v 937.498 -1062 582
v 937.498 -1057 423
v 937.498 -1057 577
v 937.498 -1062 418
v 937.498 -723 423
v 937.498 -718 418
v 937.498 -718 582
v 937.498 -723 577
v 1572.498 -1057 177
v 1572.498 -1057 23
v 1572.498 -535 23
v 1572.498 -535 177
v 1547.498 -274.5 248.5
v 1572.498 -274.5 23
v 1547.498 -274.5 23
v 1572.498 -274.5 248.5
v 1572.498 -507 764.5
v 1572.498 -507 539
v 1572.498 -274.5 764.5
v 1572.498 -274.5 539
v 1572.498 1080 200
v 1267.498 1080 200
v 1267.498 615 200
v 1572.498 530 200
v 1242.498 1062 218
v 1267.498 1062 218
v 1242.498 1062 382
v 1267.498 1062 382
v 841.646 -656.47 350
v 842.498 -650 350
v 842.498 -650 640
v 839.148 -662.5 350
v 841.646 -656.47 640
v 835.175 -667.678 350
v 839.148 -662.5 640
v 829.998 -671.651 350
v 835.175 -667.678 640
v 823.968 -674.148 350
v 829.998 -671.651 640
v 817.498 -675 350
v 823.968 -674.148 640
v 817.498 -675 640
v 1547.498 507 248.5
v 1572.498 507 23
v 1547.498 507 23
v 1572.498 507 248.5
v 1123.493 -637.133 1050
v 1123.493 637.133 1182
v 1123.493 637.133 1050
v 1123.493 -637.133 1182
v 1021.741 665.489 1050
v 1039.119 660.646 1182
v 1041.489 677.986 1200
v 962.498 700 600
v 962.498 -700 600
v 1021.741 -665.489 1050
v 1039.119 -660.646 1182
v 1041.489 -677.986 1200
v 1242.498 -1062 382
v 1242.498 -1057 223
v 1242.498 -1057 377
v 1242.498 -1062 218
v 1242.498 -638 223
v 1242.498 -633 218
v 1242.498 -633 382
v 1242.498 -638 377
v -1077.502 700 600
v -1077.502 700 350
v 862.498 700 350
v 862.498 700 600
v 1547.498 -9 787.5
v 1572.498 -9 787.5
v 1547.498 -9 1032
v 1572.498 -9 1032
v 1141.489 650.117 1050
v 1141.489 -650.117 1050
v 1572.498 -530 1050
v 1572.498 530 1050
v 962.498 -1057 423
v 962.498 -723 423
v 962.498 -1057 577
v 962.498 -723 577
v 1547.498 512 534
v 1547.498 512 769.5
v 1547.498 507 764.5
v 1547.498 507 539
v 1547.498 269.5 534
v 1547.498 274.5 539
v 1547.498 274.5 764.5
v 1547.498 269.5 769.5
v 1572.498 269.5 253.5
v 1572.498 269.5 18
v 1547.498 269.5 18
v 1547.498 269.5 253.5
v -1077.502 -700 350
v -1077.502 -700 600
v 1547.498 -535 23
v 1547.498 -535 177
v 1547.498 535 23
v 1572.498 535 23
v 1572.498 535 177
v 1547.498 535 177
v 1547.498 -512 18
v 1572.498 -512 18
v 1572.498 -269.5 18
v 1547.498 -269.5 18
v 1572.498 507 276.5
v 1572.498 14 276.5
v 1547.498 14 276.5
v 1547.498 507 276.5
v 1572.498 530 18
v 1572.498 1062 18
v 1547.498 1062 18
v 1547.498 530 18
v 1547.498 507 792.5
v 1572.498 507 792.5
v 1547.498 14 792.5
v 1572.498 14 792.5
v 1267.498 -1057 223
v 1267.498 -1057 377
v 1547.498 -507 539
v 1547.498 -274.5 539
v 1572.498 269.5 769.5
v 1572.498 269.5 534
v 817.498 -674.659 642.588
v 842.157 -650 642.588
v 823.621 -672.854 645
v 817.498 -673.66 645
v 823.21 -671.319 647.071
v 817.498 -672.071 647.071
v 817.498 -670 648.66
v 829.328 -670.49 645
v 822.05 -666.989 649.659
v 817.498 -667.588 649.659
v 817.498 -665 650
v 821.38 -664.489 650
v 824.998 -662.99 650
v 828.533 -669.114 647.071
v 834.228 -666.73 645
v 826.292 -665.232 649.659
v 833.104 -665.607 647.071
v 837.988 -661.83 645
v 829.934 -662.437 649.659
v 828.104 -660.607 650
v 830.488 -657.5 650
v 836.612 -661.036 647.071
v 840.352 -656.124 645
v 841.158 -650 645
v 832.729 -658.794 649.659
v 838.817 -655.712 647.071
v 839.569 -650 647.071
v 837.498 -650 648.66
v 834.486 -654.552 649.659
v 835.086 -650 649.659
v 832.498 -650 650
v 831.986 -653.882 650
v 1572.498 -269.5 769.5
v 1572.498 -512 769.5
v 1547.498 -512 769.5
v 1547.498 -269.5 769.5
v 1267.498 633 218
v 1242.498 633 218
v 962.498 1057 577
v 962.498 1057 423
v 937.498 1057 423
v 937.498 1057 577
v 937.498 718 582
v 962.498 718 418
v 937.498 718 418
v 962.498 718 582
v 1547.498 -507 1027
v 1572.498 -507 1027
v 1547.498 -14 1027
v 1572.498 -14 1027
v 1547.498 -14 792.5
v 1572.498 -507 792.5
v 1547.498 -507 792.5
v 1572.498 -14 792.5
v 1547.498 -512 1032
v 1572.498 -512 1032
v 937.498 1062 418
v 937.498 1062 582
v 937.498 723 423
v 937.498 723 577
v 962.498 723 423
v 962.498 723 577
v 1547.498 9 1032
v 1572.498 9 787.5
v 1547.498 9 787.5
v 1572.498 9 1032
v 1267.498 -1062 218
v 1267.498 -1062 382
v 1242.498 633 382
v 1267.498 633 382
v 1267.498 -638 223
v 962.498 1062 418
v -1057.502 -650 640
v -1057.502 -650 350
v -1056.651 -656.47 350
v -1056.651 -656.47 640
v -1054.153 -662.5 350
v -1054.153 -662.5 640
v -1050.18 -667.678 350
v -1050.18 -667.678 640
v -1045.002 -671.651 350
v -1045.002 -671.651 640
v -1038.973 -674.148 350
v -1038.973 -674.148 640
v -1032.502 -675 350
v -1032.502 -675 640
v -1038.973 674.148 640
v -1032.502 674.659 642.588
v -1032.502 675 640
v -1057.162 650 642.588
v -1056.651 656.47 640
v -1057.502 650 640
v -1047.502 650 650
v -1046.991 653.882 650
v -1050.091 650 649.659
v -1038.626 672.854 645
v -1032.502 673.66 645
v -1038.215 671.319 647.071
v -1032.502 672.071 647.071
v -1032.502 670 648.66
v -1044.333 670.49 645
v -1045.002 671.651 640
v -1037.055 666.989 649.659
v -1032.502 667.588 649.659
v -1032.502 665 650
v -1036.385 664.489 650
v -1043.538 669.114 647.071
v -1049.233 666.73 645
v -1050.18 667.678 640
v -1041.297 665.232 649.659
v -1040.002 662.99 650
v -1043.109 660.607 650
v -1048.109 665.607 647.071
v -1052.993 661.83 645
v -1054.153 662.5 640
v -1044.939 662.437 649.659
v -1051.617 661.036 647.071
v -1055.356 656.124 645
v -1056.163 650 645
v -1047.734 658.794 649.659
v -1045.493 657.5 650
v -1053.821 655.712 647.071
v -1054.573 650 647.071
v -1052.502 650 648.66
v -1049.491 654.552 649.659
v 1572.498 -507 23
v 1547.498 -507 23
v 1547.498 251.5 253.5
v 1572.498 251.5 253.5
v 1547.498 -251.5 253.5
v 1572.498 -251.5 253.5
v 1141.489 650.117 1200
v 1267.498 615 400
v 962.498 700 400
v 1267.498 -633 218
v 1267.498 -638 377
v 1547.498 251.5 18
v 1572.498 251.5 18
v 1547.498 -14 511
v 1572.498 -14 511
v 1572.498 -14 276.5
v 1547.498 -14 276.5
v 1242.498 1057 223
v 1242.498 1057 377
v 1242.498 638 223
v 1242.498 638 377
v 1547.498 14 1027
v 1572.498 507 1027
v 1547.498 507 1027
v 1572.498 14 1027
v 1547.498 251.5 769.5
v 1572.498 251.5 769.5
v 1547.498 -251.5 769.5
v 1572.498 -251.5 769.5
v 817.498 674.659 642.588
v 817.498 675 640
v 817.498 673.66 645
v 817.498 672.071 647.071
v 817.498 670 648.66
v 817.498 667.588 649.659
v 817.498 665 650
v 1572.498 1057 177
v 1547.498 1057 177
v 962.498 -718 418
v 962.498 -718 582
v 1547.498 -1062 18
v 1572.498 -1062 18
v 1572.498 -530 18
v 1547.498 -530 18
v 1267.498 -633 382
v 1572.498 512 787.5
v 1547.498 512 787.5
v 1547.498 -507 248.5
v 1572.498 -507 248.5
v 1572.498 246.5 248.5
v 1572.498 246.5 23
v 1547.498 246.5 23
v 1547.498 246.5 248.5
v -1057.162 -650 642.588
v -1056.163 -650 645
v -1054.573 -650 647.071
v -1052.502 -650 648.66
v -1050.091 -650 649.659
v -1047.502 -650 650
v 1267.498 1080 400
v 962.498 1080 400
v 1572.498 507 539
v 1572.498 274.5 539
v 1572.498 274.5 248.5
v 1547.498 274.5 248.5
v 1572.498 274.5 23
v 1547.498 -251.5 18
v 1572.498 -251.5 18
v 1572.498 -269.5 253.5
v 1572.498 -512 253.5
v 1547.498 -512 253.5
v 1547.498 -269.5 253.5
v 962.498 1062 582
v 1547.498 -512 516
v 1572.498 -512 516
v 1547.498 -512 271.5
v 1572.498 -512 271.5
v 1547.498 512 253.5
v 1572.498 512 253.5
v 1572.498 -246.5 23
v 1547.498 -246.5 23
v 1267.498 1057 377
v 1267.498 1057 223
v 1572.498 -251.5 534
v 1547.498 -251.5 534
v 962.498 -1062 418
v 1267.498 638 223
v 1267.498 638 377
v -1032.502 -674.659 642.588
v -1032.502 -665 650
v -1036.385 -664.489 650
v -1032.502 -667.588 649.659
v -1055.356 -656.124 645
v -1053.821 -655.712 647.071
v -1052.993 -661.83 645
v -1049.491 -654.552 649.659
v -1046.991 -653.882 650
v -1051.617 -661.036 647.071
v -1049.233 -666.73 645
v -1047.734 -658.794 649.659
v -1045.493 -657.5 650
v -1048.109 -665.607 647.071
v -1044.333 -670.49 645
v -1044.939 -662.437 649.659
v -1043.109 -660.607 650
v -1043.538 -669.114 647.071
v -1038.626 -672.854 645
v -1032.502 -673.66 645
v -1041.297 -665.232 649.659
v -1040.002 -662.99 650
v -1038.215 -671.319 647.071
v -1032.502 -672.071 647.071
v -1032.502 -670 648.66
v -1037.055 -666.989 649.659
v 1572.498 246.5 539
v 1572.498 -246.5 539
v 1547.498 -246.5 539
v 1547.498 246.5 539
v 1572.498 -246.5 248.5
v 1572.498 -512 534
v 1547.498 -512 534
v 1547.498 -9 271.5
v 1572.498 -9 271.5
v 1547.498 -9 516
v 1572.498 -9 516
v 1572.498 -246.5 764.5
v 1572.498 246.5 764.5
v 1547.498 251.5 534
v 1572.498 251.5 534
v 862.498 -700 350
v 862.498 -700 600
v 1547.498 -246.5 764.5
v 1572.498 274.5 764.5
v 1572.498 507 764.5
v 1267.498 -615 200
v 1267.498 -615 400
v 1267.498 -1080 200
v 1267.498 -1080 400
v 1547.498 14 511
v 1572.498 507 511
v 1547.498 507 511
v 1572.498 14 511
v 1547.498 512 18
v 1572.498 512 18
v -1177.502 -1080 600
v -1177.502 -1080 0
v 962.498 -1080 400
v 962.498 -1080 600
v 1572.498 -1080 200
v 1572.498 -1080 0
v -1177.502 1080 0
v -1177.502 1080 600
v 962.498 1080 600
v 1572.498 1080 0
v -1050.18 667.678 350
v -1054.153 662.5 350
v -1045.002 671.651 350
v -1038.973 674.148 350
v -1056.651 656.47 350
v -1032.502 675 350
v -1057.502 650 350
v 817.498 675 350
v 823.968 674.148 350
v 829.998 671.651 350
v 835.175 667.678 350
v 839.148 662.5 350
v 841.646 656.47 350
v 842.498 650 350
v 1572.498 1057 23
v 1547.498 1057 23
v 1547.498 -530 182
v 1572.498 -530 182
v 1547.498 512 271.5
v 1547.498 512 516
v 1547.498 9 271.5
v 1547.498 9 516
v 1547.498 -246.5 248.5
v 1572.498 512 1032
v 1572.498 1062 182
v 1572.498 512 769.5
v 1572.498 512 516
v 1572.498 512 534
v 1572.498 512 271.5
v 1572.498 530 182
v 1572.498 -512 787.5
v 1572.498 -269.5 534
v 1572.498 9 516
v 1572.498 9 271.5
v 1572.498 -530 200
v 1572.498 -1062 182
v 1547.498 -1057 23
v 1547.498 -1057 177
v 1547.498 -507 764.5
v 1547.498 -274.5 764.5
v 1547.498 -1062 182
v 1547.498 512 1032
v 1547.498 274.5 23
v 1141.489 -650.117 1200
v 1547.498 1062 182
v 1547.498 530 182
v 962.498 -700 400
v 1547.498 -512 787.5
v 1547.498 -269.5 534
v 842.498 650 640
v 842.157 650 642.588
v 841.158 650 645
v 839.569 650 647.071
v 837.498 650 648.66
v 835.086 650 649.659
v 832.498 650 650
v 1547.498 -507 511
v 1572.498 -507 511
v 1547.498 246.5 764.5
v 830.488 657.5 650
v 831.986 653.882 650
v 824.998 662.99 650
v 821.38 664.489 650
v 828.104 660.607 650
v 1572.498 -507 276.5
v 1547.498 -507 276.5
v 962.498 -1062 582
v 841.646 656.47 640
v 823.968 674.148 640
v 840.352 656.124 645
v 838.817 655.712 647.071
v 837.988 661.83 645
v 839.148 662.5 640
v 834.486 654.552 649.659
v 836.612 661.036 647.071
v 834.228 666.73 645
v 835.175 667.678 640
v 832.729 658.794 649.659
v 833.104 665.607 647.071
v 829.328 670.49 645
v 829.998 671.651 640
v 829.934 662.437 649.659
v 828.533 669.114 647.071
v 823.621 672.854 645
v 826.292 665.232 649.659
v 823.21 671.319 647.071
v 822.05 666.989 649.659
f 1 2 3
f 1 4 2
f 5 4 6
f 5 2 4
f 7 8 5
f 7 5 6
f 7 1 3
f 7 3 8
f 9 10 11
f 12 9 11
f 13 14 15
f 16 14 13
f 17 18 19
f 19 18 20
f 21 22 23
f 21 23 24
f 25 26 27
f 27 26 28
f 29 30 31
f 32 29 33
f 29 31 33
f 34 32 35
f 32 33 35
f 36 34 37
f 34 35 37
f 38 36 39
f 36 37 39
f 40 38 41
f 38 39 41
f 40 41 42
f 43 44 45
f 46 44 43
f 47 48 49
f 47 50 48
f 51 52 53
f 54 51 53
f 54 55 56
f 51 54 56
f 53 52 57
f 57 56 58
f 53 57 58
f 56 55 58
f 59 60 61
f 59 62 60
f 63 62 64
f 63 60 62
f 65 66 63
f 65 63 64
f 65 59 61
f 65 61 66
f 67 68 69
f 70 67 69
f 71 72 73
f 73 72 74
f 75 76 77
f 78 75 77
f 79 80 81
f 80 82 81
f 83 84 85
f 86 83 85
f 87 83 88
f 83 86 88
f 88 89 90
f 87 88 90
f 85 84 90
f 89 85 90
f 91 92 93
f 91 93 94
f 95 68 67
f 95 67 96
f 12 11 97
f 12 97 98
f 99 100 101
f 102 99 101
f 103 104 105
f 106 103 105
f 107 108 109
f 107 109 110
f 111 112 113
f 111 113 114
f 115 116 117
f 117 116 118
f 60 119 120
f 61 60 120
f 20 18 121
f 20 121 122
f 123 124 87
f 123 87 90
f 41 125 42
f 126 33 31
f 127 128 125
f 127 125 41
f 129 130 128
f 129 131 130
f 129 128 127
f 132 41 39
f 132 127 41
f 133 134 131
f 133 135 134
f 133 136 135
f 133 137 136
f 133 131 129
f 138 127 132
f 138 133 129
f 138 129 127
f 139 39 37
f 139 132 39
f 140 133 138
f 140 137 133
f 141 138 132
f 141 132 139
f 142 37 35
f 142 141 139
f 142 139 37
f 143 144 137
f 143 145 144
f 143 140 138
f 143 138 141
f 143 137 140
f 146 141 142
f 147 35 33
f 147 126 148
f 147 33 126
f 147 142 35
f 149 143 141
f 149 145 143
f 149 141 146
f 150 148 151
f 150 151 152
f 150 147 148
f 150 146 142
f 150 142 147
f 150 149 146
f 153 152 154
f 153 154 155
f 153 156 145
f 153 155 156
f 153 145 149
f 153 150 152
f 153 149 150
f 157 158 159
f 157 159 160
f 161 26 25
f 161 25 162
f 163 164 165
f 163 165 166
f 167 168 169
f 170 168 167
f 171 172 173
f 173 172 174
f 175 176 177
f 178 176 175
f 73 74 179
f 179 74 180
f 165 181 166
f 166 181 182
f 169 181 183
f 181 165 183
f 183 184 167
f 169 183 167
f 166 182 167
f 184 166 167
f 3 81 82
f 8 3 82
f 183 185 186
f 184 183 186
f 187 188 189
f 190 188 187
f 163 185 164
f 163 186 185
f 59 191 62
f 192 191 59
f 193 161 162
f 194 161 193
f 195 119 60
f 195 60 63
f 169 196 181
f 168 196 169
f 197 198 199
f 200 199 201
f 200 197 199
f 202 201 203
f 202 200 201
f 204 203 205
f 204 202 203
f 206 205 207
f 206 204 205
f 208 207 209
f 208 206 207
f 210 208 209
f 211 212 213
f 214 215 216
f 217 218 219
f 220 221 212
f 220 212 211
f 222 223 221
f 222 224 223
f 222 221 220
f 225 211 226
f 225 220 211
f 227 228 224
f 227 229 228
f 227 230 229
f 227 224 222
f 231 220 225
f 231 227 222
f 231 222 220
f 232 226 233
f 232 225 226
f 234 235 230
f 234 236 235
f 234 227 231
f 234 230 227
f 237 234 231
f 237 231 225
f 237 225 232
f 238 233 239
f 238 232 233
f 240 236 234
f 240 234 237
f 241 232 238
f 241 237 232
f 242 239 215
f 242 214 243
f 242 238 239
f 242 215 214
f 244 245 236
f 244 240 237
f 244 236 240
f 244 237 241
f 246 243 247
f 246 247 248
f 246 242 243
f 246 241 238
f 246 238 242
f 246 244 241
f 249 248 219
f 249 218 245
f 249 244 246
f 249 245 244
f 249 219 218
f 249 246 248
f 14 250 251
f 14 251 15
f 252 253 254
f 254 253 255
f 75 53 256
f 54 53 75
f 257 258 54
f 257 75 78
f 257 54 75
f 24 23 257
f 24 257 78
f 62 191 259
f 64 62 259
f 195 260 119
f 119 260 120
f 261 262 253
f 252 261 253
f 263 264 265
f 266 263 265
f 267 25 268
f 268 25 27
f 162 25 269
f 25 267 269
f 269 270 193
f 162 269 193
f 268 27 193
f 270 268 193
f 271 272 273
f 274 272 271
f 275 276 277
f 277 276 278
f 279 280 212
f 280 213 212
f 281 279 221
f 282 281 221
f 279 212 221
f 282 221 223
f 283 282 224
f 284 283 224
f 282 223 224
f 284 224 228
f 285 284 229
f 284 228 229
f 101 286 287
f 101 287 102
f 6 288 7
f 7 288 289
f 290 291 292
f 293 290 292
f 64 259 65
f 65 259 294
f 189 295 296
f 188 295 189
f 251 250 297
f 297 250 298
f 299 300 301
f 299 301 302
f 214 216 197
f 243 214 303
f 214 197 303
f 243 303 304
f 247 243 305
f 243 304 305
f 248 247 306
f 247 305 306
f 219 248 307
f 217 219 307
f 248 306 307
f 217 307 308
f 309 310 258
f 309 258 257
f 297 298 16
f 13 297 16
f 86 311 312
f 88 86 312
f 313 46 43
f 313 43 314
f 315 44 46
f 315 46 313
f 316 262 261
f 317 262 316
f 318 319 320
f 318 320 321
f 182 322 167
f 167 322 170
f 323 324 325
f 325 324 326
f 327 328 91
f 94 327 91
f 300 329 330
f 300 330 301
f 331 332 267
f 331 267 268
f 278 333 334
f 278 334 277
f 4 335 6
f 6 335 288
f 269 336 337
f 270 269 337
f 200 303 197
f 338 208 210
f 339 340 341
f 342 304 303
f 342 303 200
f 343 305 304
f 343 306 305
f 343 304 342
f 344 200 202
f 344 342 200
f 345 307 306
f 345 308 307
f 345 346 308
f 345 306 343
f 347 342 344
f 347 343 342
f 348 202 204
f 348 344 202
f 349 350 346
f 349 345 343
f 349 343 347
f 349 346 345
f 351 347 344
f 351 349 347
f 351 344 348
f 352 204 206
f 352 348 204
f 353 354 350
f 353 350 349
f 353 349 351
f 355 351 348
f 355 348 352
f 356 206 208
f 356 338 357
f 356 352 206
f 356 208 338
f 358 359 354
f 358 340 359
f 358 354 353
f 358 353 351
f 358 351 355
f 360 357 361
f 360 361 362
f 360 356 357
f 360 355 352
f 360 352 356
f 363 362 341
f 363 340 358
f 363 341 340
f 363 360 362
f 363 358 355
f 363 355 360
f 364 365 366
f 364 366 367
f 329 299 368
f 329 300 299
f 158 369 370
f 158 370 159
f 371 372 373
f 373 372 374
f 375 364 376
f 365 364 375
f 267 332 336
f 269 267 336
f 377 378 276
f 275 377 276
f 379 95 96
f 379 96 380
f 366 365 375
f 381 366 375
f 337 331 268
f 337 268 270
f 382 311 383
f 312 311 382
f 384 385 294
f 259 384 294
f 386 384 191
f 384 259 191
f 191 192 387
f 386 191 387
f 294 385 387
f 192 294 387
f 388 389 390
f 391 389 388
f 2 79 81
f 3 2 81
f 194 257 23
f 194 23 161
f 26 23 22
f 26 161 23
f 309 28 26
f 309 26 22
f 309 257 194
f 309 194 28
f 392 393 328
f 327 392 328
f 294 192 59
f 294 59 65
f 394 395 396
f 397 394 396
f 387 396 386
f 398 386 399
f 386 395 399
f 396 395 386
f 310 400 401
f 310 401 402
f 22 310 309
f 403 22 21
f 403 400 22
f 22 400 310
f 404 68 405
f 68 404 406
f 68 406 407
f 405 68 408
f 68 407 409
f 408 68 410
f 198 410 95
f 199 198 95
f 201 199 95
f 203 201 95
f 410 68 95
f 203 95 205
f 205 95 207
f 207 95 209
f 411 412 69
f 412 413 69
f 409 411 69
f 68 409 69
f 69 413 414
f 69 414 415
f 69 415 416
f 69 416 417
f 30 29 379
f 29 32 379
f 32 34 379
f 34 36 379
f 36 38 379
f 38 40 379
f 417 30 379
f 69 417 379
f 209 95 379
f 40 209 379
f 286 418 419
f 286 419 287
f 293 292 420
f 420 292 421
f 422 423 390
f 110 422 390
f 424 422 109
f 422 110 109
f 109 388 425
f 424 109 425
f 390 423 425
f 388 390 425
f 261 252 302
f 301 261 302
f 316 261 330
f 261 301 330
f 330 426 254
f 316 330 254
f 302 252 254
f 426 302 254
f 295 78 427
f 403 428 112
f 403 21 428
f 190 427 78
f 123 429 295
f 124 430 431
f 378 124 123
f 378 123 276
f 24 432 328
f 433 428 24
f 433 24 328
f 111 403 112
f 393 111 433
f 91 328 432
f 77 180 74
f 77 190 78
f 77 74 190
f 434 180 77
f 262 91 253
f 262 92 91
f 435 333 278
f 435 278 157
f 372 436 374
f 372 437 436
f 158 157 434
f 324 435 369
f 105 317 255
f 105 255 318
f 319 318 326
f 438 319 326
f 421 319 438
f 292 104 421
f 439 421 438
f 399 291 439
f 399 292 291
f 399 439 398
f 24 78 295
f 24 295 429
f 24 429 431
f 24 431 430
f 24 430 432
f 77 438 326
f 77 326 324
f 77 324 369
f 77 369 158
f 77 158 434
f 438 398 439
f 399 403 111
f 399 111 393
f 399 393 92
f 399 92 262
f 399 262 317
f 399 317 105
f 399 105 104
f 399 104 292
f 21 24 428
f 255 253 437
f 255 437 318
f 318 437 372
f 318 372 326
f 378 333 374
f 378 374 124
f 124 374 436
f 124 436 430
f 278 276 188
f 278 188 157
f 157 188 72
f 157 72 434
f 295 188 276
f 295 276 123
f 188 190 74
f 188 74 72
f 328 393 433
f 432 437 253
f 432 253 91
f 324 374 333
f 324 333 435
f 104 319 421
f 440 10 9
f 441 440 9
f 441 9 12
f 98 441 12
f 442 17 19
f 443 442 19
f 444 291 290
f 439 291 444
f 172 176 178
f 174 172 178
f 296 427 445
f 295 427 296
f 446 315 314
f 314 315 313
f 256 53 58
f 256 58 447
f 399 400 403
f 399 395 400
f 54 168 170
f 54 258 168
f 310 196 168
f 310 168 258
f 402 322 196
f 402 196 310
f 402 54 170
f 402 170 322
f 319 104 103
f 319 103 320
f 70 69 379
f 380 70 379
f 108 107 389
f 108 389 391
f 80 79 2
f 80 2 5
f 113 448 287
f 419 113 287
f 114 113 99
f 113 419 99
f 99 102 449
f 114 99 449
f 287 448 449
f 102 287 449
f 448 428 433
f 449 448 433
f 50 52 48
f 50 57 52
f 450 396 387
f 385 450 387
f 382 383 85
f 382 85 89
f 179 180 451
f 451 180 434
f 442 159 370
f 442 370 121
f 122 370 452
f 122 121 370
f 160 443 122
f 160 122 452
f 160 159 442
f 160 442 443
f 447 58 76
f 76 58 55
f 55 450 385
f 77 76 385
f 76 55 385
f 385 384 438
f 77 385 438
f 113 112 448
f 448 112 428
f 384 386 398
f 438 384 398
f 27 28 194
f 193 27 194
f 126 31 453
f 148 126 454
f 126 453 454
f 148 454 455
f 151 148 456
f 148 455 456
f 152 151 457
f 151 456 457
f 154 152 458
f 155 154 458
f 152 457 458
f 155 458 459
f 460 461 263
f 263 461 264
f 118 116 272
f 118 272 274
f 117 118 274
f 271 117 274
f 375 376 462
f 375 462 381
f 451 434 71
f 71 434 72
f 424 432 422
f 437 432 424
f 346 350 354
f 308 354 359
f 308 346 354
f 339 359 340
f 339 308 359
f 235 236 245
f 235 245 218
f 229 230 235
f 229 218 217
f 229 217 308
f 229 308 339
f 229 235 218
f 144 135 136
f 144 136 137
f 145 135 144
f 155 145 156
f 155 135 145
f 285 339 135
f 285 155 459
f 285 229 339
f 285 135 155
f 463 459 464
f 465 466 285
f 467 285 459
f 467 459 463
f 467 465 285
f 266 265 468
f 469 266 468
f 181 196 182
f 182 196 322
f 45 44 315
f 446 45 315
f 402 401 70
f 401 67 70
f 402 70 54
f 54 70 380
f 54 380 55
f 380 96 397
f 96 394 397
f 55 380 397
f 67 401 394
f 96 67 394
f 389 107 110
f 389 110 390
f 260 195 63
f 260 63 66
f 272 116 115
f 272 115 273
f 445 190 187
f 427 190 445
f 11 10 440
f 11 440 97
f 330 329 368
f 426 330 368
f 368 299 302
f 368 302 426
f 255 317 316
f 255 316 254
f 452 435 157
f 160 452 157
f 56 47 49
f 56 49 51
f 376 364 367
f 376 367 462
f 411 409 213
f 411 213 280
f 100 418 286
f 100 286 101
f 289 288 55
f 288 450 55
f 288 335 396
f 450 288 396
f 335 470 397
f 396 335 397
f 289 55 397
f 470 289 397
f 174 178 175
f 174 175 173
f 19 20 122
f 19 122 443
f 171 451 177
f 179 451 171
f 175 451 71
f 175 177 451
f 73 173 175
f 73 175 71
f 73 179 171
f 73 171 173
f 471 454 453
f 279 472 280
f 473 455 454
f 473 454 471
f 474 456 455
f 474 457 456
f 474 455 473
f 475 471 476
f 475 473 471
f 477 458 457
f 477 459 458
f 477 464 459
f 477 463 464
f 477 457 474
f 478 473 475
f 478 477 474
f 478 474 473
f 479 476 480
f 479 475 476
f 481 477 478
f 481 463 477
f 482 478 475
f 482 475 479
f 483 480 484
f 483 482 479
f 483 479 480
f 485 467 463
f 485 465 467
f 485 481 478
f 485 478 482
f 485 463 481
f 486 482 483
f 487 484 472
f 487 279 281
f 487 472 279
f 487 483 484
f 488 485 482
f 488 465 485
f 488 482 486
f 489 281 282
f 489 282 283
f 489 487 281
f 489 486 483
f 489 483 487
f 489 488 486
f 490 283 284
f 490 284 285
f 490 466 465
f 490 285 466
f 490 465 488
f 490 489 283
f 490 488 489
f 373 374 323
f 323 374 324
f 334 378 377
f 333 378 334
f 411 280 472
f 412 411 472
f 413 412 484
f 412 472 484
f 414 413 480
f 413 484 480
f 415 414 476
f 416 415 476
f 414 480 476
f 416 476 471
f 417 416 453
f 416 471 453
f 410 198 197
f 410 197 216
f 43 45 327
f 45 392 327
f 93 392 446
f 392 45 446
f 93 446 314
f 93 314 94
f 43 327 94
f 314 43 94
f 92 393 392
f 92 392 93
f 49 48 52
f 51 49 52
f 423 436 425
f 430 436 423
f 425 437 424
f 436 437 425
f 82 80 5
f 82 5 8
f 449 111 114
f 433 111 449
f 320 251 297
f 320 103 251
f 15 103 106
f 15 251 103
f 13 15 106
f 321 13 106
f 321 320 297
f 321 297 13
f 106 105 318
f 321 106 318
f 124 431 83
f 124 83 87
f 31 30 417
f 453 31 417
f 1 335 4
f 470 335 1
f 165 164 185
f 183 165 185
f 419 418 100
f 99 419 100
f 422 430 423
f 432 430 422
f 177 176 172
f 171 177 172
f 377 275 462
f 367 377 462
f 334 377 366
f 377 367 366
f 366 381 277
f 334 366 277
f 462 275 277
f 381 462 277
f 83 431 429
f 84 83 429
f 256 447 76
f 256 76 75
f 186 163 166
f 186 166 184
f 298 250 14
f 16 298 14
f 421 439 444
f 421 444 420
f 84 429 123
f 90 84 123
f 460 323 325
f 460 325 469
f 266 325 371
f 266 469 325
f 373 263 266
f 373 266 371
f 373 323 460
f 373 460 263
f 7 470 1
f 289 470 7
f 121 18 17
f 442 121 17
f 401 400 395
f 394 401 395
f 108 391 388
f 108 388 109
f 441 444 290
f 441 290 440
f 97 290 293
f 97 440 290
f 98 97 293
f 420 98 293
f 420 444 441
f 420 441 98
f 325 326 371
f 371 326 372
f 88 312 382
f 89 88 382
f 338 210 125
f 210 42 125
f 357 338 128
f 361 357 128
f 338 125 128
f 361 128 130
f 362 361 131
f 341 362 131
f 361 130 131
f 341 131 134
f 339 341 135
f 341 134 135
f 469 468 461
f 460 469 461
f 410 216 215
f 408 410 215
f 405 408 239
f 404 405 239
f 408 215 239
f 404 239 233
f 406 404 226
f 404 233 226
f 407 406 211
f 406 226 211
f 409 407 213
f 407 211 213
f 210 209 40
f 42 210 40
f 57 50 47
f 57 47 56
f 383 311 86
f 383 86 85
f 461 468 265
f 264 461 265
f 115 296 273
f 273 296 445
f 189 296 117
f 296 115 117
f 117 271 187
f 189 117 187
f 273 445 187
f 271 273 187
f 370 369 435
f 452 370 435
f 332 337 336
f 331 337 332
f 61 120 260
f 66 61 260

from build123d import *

# Parameters (mm, degrees)
F0_W           = 2750
F0_H           = 2160
F0_W_2         = 1940
F0_H_2         = 1400
F1_DEPTH       = 600
F3_DEPTH       = 200
F4_DEPTH       = 400
F6_DEPTH       = 600
F8_DEPTH       = 150
F9_W           = 532
F9_H           = 164
F9_W_2         = 522
F9_H_2         = 154
F10_DEPTH      = 25
F11_W          = 429
F11_H          = 164
F11_W_2        = 419.0000095367
F11_H_2        = 154.0000095367
F12_DEPTH      = 25
F13_W          = 344
F13_H          = 164
F13_W_2        = 334.0000095367
F13_H_2        = 154.0000095367
F14_DEPTH      = 25
F15_W          = 493
F15_H          = 234.5
F15_W_2        = 503
F15_H_2        = 244.5
F15_W_3        = 242.5
F15_H_3        = 235.5
F15_W_4        = 232.5000095367
F15_H_4        = 225.5000095367
F16_DEPTH      = 25
F17_W          = 3195.5926638842
F17_H          = 1080
F18_DEPTH      = 600.001
F18_DEPTH_BACK = 600.001
F20_W          = 1940
F20_H          = 1400
F21_DEPTH      = 350
F22_W          = 1900
F22_H          = 1350
F23_DEPTH      = 300
F24_R          = 25
F29_W          = 167.1301784746
F29_H          = 132
F27_W          = 167.1301784746
F27_H          = 132
F32_DEPTH      = 2160.001
F33_R          = 10


with BuildPart() as f1:
    # F0 (on Top) → F1 (new body)
    with BuildSketch(Plane.XY):
        with Locations((197.4975842237, 0)):
            Rectangle(F0_W, F0_H)
        with Locations((-107.5024157763, 0)):
            Rectangle(F0_W_2, F0_H_2, mode=Mode.SUBTRACT)
    extrude(amount=F1_DEPTH)

    # F2 (on face) → F3 (cut)
    with BuildSketch(Plane.XY.offset(600)):
        Polygon((1267.4975842237, 1080), (962.4975842237, 1080), (962.4975842237, 700), (1267.4975842237, 615), align=None)
        Polygon((1267.4975842237, -615), (962.4975842237, -700), (962.4975842237, -1080), (1267.4975842237, -1080), align=None)
    extrude(amount=-F3_DEPTH, mode=Mode.SUBTRACT)

    # F2 (on face) → F4 (cut)
    with BuildSketch(Plane.XY.offset(600)):
        Polygon((1572.4975842237, -530), (1267.4975842237, -615), (1267.4975842237, -1080), (1572.4975842237, -1080), align=None)
        Polygon((1572.4975842237, 1080), (1267.4975842237, 1080), (1267.4975842237, 615), (1572.4975842237, 530), align=None)
    extrude(amount=-F4_DEPTH, mode=Mode.SUBTRACT)

    # F5 (on face) → F6 (join)
    with BuildSketch(Plane.XY.offset(600)):
        Polygon((1572.4975842237, -530), (1572.4975842237, 530), (962.4975842237, 700), (962.4975842237, -700), align=None)
    extrude(amount=F6_DEPTH)

    # F7 (on face) → F8 (cut)
    with BuildSketch(Plane.XY.offset(1200)):
        Polygon((1572.4975842237, 530), (1141.4890827762, 650.1171233542), (1141.4890827762, -650.1171233542), (1572.4975842237, -530), align=None)
    extrude(amount=-F8_DEPTH, mode=Mode.SUBTRACT)

    # F9 (on face) → F10 (cut)
    with BuildSketch(Plane.YZ.offset(1572.4975842237)):
        with Locations((-796, 100)):
            Rectangle(F9_W, F9_H)
        with Locations((-796, 100)):
            Rectangle(F9_W_2, F9_H_2, mode=Mode.SUBTRACT)
    extrude(amount=-F10_DEPTH, mode=Mode.SUBTRACT)

    # F11 (on face) → F12 (cut)
    with BuildSketch(Plane.YZ.offset(1267.4975842237)):
        with Locations((-847.5, 300)):
            Rectangle(F11_W, F11_H)
        with Locations((-847.5, 300)):
            Rectangle(F11_W_2, F11_H_2, mode=Mode.SUBTRACT)
    extrude(amount=-F12_DEPTH, mode=Mode.SUBTRACT)

    # F13 (on face) → F14 (cut)
    with BuildSketch(Plane.YZ.offset(962.4975842237)):
        with Locations((-890, 500)):
            Rectangle(F13_W, F13_H)
        with Locations((-890, 500)):
            Rectangle(F13_W_2, F13_H_2, mode=Mode.SUBTRACT)
    extrude(amount=-F14_DEPTH, mode=Mode.SUBTRACT)

    # F15 (on face) → F16 (cut)
    with BuildSketch(Plane.YZ.offset(1572.4975842237)):
        Polygon((-9, 787.5), (-9, 1032), (-512, 1032), (-512, 787.5), (-260.5, 787.5), align=None)
        with Locations((-260.5, 909.75)):
            Rectangle(F15_W, F15_H, mode=Mode.SUBTRACT)
        with Locations((260.5, 909.75)):
            Rectangle(F15_W_2, F15_H_2)
        with Locations((260.5, 909.75)):
            Rectangle(F15_W, F15_H, mode=Mode.SUBTRACT)
        with Locations((-390.75, 651.75)):
            Rectangle(F15_W_3, F15_H_3)
        with Locations((-390.75, 651.75)):
            Rectangle(F15_W_4, F15_H_4, mode=Mode.SUBTRACT)
        with Locations((0, 651.75)):
            Rectangle(F15_W_2, F15_H_3)
        Polygon((246.5000047684, 538.9999952316), (-246.5000047684, 538.9999952316), (-246.5000047684, 651.75), (-246.5000047684, 764.5000047684), (246.5000047684, 764.5000047684), (246.5000047684, 651.75), align=None, mode=Mode.SUBTRACT)
        with Locations((390.75, 651.75)):
            Rectangle(F15_W_3, F15_H_3)
        with Locations((390.75, 651.75)):
            Rectangle(F15_W_4, F15_H_4, mode=Mode.SUBTRACT)
        Polygon((512, 271.5), (512, 516), (9, 516), (9, 393.75), (9, 271.5), align=None)
        Polygon((14, 276.5), (14, 393.75), (14, 511), (507, 511), (507, 276.5), align=None, mode=Mode.SUBTRACT)
        Polygon((-9, 516), (-512, 516), (-512, 271.5), (-9, 271.5), (-9, 393.75), align=None)
        Polygon((-14, 511), (-14, 393.75), (-14, 276.5), (-507, 276.5), (-507, 511), align=None, mode=Mode.SUBTRACT)
        with Locations((390.75, 135.75)):
            Rectangle(F15_W_3, F15_H_3)
        with Locations((390.75, 135.75)):
            Rectangle(F15_W_4, F15_H_4, mode=Mode.SUBTRACT)
        with Locations((0, 135.75)):
            Rectangle(F15_W_2, F15_H_3)
        Polygon((-246.5000047684, 135.75), (-246.5000047684, 248.5000047684), (246.5000047684, 248.5000047684), (246.5000047684, 135.75), (246.5000047684, 22.9999952316), (-246.5000047684, 22.9999952316), align=None, mode=Mode.SUBTRACT)
        with Locations((-390.75, 135.75)):
            Rectangle(F15_W_3, F15_H_3)
        with Locations((-390.75, 135.75)):
            Rectangle(F15_W_4, F15_H_4, mode=Mode.SUBTRACT)
    extrude(amount=-F16_DEPTH, mode=Mode.SUBTRACT)

    # F17 (on face) → F18 (cut, two sides)
    with BuildSketch(Plane.XY.offset(600)) as f18_sk:
        with Locations((420.2939161658, 540)):
            Rectangle(F17_W, F17_H)
    extrude(amount=F18_DEPTH, mode=Mode.SUBTRACT)
    extrude(f18_sk.sketch, amount=-F18_DEPTH_BACK, mode=Mode.SUBTRACT)

    # F19: F1 across face


with BuildPart() as f1_1:
    add(f1.part)
    add(f1.part.mirror(Plane(origin=(1230.0313780775, 0, 528.6800777303), x_dir=(-1, 0, 0), z_dir=(0, 1, 0))))

    # F20 (on face) → F21 (join)
    with BuildSketch(Plane(origin=(0, 0, 0), x_dir=(1, 0, 0), z_dir=(0, 0, -1))):
        with Locations((-107.5024157763, 0)):
            Rectangle(F20_W, F20_H)
    extrude(amount=-F21_DEPTH)

    # F22 (on face) → F23 (join)
    with BuildSketch(Plane.XY.offset(350)):
        with Locations((-107.5024157763, 0)):
            Rectangle(F22_W, F22_H)
    extrude(amount=F23_DEPTH)

    # F24
    f24_edges = [f1_1.edges().sort_by_distance(p)[0] for p in [
        (-1057.502416, 675, 500),
        (-1057.502416, -675, 500),
        (842.497584, 675, 500),
        (842.497584, -675, 500),
    ]]
    fillet(f24_edges, radius=F24_R)

    # F29 (on plane+point) → F30 section 0
    with BuildSketch(Plane(origin=(245.7346139254, 881.7536146733, 0), x_dir=(-0.9632913238, 0.2684582378, 0), z_dir=(0.2684582378, 0.9632913238, 0))):
        with Locations((-827.6421431545, 1116)):
            Rectangle(F29_W, F29_H)
    # F27 (on plane+point) → F30 section 1
    with BuildSketch(Plane(origin=(245.7346139254, -881.7536146733, 0), x_dir=(0.9632913238, 0.2684582378, 0), z_dir=(0.2684582378, -0.9632913238, 0))):
        with Locations((827.6421431545, 1116)):
            Rectangle(F27_W, F27_H)
    loft(mode=Mode.SUBTRACT)

    # F31 (on face) → F32 (cut, through all)
    with BuildSketch(Plane.XZ.offset(1080)):
        Polygon((962.4975842237, 600), (1041.4890827762, 1200), (962.4975842237, 1200), align=None)
    extrude(amount=-F32_DEPTH, mode=Mode.SUBTRACT)

    # F33
    f33_edges = [f1_1.edges().sort_by_distance(p)[0] for p in [
        (-107.502416, -675, 650),
        (-1050.180085, -667.67767, 650),
        (835.175254, -667.67767, 650),
        (-1057.502416, 0, 650),
        (842.497584, 0, 650),
        (-1050.180085, 667.67767, 650),
        (835.175254, 667.67767, 650),
        (-107.502416, 675, 650),
    ]]
    fillet(f33_edges, radius=F33_R)


solid = f1_1.part
